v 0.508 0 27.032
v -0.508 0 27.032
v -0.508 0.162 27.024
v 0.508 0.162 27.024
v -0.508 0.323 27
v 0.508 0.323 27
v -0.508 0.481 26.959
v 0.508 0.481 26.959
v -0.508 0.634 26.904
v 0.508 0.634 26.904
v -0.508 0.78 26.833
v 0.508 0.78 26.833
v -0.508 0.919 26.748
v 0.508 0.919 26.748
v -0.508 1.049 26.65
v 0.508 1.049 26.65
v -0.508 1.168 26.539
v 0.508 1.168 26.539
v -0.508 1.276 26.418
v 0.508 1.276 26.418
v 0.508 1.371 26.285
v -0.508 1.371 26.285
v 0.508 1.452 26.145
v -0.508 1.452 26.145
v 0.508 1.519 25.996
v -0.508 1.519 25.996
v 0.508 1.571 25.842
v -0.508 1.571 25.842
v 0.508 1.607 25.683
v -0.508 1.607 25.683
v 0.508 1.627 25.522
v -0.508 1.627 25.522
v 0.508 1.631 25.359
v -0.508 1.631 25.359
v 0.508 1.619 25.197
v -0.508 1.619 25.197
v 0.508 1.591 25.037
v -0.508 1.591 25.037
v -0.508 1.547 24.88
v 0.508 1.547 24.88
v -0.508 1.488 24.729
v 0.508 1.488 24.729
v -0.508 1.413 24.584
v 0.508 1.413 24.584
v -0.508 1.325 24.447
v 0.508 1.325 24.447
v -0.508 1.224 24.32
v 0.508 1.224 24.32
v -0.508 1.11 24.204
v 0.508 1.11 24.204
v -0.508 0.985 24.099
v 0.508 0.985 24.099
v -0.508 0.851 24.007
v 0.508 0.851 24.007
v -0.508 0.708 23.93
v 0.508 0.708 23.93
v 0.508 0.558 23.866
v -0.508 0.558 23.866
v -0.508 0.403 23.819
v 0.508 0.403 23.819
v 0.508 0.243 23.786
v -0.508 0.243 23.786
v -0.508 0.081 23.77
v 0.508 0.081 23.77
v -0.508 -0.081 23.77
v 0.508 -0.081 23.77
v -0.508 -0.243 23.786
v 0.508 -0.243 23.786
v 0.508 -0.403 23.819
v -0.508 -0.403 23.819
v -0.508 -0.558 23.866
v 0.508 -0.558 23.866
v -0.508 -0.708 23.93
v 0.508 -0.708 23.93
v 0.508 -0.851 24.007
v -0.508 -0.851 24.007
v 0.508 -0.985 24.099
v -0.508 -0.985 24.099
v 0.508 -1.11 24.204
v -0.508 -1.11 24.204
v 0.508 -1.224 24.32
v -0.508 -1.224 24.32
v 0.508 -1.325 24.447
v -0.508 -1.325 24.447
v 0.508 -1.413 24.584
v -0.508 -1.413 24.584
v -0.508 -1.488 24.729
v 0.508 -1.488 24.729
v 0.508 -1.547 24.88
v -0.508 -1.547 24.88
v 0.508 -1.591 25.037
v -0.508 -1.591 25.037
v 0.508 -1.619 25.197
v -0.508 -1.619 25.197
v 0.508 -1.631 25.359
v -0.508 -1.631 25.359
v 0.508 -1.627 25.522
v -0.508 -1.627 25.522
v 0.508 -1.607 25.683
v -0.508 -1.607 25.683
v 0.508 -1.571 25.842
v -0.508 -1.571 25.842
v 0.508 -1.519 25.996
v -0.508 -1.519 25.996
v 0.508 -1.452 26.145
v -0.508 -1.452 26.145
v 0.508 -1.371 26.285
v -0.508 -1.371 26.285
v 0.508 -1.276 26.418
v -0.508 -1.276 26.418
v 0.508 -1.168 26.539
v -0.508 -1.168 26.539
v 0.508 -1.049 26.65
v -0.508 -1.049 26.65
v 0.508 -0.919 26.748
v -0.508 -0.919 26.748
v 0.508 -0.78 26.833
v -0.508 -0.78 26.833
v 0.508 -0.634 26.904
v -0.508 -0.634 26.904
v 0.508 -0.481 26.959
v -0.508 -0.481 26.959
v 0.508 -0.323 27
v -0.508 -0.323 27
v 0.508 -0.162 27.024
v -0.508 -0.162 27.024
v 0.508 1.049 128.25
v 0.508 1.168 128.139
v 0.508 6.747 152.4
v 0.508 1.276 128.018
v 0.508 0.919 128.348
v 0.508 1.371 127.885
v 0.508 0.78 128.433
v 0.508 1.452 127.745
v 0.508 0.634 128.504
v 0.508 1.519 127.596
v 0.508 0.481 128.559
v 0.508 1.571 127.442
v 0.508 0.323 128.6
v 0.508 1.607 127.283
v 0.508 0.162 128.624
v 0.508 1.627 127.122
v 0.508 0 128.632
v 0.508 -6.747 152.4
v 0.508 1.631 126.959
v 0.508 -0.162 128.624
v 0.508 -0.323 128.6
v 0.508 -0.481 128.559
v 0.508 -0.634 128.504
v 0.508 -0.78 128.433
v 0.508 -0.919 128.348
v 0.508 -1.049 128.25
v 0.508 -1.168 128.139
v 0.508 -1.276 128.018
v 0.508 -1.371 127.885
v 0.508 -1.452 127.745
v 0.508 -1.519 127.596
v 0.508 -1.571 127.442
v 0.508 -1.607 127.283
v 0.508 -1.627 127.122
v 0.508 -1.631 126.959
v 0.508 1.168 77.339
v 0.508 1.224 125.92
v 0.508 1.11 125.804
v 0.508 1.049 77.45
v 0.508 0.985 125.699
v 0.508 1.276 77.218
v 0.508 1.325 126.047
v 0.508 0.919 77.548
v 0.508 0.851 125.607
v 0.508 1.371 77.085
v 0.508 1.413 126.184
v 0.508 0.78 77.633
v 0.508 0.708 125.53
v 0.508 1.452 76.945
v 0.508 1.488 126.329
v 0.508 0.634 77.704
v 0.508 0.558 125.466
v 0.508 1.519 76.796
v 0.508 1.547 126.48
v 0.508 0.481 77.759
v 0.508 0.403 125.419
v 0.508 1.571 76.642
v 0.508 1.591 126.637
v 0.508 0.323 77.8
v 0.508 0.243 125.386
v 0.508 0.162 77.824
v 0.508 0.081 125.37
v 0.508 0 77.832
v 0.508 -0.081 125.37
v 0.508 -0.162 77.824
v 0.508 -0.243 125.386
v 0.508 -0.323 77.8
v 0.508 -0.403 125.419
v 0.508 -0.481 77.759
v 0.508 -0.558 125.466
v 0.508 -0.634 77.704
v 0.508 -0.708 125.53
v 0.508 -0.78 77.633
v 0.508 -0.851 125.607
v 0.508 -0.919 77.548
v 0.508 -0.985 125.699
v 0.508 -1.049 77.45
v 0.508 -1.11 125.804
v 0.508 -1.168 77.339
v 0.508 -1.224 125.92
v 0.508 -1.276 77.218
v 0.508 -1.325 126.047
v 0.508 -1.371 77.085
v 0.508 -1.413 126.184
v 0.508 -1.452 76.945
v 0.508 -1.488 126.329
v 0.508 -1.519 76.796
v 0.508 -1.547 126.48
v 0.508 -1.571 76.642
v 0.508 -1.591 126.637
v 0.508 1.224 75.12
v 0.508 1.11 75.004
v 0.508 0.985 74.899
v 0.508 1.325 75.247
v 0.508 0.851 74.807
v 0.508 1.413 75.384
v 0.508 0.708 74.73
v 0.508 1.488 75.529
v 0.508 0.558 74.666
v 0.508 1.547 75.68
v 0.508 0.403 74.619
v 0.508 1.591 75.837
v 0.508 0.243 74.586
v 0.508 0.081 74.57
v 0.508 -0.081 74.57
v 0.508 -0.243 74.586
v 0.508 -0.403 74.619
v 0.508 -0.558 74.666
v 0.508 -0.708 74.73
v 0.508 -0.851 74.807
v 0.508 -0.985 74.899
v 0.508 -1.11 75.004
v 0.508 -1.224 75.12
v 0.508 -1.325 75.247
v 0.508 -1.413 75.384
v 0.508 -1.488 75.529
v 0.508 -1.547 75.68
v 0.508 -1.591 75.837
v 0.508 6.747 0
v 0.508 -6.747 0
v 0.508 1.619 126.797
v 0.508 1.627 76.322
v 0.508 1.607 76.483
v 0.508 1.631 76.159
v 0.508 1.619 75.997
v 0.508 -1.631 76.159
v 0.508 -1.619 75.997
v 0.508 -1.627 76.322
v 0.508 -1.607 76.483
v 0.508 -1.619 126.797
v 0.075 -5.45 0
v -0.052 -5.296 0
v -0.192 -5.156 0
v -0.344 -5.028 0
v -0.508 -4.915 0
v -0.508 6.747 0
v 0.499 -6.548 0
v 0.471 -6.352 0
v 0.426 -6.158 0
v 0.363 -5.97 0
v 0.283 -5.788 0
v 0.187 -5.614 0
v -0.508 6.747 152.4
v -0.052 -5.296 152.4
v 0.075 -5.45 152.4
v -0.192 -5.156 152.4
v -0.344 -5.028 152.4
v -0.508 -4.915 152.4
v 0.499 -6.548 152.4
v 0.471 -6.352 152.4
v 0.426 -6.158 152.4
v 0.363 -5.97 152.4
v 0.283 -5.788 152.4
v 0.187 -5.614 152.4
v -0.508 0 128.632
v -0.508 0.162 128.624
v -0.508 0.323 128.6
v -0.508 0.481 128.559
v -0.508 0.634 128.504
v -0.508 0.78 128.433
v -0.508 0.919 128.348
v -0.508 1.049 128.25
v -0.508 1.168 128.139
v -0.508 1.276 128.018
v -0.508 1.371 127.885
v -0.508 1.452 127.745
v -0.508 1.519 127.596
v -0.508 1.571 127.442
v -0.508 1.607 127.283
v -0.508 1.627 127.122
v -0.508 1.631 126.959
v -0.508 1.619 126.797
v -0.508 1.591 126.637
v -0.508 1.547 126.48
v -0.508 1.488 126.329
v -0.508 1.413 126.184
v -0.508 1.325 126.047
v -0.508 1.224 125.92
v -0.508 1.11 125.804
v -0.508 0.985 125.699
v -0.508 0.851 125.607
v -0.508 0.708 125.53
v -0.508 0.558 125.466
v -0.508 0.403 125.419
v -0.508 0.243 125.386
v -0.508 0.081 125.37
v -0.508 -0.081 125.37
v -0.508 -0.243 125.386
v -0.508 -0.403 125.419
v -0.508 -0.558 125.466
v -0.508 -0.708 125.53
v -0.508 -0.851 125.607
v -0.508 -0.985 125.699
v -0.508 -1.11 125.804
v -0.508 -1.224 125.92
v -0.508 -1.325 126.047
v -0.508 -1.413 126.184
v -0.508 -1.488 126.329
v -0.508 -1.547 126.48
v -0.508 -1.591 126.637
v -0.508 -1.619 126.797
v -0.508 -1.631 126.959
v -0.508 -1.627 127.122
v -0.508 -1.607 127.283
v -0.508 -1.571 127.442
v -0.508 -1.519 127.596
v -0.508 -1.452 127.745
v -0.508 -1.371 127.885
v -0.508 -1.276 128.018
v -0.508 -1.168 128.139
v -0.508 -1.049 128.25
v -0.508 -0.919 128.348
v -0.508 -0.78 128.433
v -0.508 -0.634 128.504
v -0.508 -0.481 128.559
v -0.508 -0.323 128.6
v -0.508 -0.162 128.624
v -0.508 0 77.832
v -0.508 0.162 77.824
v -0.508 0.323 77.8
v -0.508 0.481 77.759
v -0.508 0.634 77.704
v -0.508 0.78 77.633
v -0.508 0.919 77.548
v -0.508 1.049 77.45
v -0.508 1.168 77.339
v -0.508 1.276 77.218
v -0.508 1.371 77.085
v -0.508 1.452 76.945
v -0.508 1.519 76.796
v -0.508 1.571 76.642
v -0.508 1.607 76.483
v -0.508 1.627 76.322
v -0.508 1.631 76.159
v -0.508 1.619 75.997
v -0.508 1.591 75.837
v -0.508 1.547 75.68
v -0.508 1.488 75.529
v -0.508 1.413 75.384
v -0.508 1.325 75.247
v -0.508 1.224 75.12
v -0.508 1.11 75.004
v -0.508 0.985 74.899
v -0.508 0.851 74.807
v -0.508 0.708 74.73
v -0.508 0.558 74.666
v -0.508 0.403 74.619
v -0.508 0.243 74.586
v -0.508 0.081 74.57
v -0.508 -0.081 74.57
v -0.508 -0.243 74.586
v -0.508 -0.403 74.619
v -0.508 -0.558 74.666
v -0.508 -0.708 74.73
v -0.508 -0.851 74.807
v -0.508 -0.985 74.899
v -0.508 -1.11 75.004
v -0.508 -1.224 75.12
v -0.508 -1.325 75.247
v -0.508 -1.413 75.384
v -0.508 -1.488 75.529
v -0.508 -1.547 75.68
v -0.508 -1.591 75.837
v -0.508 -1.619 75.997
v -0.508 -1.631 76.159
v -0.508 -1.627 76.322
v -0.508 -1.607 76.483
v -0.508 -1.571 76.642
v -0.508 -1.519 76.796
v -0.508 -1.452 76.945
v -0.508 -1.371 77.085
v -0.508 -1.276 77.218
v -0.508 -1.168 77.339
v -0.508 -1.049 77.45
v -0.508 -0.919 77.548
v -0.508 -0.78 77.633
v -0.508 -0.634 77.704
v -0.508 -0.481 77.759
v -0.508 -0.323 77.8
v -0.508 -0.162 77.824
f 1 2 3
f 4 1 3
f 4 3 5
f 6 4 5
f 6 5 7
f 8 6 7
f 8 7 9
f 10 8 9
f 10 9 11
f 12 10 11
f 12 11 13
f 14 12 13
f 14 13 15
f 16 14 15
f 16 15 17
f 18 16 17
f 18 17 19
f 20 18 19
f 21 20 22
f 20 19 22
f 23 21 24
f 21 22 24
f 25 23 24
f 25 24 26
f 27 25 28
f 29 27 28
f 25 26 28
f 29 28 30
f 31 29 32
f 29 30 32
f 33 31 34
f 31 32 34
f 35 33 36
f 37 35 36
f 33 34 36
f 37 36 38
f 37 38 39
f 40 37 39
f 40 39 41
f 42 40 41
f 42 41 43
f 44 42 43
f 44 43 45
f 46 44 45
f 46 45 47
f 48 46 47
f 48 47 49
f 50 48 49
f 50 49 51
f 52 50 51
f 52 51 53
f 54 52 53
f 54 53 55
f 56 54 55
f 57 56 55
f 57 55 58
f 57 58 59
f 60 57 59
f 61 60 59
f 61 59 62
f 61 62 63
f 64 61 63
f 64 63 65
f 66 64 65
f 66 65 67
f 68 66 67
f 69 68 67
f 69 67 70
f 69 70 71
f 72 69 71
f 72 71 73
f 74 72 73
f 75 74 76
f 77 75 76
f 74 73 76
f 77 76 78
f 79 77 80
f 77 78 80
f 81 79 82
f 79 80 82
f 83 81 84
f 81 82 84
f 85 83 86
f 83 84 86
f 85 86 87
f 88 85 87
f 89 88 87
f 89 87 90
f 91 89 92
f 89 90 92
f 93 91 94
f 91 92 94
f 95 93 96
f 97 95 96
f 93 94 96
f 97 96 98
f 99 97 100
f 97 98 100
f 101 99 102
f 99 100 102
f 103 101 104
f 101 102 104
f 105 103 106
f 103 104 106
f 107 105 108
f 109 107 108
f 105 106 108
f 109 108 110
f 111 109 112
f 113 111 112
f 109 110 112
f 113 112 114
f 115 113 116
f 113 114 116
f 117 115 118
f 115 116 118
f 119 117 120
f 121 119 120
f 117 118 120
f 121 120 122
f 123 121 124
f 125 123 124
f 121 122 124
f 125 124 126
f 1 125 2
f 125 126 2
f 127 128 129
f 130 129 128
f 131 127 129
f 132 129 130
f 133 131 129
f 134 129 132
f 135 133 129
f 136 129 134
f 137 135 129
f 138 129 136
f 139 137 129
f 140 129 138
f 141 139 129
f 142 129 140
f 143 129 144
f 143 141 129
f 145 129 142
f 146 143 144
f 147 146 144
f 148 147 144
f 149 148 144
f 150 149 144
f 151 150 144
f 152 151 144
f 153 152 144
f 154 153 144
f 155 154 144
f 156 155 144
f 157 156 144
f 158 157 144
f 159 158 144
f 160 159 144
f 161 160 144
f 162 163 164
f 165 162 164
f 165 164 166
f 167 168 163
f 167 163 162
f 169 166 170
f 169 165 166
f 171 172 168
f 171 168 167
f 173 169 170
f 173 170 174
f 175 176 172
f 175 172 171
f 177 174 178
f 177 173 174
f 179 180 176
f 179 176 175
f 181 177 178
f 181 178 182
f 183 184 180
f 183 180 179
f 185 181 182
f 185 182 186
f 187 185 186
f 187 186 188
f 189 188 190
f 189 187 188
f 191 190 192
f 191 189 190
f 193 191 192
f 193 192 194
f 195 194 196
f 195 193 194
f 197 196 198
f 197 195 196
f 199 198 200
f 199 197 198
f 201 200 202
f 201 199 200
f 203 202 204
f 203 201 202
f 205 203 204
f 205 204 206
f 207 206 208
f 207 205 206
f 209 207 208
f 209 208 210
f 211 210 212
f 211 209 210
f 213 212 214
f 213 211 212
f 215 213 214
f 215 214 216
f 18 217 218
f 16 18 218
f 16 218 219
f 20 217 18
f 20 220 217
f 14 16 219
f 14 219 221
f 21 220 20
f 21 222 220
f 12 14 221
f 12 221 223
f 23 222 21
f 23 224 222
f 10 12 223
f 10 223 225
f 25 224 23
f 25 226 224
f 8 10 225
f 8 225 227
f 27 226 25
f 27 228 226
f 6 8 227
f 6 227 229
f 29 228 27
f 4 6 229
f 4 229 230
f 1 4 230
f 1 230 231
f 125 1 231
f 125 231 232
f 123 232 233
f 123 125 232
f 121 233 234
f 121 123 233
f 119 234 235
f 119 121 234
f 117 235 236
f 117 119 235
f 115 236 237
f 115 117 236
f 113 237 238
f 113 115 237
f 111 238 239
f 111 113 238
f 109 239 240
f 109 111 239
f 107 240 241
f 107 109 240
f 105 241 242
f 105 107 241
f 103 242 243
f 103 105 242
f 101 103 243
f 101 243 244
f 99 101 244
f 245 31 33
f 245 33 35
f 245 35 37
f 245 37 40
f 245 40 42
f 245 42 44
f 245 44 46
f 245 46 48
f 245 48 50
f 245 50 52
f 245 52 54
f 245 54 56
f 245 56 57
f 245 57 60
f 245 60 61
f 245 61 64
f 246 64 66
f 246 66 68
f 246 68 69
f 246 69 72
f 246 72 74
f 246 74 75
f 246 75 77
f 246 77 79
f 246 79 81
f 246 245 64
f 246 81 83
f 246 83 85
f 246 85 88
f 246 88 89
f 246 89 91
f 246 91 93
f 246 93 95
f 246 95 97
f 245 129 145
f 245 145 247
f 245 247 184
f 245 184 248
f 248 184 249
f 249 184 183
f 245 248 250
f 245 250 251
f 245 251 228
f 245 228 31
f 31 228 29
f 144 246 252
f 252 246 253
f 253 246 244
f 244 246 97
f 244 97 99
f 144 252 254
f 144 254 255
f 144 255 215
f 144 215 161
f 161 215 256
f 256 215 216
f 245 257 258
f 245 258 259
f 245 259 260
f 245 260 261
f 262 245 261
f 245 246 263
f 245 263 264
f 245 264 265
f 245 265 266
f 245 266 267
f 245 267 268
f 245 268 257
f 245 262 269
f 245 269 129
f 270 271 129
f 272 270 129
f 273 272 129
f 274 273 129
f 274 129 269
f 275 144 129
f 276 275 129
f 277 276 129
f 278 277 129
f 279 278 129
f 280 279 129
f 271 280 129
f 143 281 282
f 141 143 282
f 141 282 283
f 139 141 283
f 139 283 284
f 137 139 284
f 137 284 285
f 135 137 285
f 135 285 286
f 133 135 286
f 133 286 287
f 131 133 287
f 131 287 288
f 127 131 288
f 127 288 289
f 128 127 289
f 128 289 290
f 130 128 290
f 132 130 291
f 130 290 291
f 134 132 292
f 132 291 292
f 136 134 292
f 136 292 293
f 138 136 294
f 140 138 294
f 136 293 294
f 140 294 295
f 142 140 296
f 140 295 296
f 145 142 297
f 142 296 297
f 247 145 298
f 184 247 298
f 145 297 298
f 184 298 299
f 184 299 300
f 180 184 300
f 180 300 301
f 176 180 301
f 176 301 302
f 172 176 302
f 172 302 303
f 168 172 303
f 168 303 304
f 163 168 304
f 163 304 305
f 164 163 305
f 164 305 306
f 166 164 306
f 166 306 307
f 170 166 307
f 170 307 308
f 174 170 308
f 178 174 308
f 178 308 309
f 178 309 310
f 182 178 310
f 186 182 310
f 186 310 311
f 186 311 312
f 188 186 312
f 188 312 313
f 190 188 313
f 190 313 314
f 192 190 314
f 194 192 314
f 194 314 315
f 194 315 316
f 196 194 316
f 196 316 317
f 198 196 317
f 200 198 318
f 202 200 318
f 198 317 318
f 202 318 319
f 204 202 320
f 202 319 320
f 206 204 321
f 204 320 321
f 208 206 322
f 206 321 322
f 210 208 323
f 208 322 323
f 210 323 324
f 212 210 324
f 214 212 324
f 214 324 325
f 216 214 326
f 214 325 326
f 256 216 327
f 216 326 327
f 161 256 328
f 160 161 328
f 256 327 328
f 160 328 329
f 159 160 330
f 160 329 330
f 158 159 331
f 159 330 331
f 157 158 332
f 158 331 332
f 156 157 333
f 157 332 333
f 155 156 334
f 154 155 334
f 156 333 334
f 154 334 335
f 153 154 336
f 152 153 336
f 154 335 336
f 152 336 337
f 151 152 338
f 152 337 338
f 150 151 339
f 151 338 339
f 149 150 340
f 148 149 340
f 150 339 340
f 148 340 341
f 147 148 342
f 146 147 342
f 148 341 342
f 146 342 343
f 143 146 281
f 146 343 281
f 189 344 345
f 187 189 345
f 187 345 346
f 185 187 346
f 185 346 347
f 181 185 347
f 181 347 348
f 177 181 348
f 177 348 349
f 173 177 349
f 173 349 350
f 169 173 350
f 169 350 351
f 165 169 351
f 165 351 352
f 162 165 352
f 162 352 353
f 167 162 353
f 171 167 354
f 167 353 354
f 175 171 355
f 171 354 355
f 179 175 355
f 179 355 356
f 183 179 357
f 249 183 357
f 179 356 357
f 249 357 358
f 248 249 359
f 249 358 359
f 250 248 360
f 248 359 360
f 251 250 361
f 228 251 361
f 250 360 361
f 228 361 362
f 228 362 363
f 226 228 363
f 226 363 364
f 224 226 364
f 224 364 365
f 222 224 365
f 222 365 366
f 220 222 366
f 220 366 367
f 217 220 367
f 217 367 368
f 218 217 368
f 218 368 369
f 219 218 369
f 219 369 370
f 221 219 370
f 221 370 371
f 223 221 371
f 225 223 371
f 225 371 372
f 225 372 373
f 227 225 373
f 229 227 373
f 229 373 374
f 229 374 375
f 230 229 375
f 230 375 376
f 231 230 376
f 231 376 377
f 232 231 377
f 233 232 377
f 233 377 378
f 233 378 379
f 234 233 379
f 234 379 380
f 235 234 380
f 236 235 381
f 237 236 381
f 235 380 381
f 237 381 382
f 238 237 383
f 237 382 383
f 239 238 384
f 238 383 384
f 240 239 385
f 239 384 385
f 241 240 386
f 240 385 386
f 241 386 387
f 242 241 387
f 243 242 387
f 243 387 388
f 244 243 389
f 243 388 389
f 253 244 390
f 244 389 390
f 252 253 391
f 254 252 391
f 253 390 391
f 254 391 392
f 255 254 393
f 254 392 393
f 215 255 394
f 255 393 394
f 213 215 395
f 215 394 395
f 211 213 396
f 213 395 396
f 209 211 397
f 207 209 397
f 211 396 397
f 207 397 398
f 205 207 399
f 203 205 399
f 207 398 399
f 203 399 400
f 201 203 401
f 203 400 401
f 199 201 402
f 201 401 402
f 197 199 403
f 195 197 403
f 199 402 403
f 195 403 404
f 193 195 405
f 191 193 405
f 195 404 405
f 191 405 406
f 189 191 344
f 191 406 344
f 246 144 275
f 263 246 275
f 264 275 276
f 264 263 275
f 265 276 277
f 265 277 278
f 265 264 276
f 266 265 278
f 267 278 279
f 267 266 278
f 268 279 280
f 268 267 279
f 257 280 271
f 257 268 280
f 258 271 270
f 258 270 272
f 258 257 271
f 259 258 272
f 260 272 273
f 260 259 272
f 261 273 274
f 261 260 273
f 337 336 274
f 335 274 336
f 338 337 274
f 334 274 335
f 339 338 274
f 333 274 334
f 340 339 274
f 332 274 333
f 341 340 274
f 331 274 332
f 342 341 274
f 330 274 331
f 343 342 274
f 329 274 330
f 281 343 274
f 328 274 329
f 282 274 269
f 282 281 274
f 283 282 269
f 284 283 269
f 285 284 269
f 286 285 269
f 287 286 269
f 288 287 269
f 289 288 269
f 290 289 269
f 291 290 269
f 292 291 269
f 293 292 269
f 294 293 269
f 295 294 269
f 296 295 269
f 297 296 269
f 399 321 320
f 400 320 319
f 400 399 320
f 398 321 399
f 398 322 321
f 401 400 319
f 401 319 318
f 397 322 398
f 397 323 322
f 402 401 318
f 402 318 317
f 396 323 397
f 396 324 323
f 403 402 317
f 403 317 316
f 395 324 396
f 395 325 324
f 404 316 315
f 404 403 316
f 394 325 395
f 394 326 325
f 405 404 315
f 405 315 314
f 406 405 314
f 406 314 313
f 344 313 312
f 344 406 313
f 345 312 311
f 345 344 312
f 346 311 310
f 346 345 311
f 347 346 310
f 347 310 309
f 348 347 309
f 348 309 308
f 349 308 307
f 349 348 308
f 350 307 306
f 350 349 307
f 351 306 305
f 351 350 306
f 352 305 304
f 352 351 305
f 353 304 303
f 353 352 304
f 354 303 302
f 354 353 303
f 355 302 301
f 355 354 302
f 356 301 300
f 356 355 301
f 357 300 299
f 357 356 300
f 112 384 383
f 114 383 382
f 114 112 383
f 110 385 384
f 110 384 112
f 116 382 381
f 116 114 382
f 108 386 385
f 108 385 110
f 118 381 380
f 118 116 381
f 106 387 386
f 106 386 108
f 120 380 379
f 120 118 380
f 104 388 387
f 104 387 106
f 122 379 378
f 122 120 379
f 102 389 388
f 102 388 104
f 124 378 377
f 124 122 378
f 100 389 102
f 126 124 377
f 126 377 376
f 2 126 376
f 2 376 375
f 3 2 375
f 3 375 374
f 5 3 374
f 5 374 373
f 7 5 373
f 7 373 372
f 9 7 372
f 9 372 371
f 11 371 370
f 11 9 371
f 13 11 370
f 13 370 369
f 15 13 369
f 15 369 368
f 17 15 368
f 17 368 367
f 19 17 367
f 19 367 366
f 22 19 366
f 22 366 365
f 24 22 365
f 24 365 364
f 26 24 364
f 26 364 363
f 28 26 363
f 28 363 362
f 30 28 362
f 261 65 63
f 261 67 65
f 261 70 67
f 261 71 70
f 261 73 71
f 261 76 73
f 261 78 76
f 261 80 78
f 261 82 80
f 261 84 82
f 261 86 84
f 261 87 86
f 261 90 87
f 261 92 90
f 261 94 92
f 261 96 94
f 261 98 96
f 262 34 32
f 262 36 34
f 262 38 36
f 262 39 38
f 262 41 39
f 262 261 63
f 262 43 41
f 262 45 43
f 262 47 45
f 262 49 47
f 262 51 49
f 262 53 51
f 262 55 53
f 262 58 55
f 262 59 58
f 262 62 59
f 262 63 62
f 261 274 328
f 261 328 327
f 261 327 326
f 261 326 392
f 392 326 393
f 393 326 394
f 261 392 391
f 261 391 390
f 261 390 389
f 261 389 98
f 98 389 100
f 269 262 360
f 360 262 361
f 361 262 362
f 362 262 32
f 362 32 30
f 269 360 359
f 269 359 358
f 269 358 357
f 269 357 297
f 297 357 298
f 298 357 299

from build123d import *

# Parameters (mm, degrees)
BOSS_EXTRUDE3_DEPTH       = 152.4
F_4_CLEARANCE_HOLE2_D     = 3.2639
F_4_CLEARANCE_HOLE2_DEPTH = 1.524
F_4_CLEARANCE_HOLE2_TIP   = 0.980574487


with BuildPart() as part:
    # Sketch2 → Boss-Extrude3 (new body)
    with BuildSketch(Plane.XY):
        with BuildLine():
            Line((-0.508, -4.915254952), (-0.508, 6.746875))
            Line((-0.508, 6.746875), (0.508, 6.746875))
            Line((0.508, 6.746875), (0.508, -6.746875))
            ThreePointArc((0.508, -6.746875), (0.236990731, -5.699606171), (-0.508, -4.915254952))
        make_face()
    extrude(amount=BOSS_EXTRUDE3_DEPTH)

    # #4 Clearance Hole2
    with Locations(Plane(origin=(0.508, 0, 0), x_dir=(0, 0, -1), z_dir=(1, 0, 0))):
        with Locations((-25.4, 0), (-76.2, 0), (-177.8, 0), (-127, 0), (-228.6, 0), (-279.4, 0)):
            Hole(F_4_CLEARANCE_HOLE2_D / 2, depth=F_4_CLEARANCE_HOLE2_DEPTH)
            with Locations((0, 0, -(F_4_CLEARANCE_HOLE2_DEPTH + F_4_CLEARANCE_HOLE2_TIP / 2))):  # 118° drill point
                Cone(0, F_4_CLEARANCE_HOLE2_D / 2, F_4_CLEARANCE_HOLE2_TIP, mode=Mode.SUBTRACT)


solid = part.part
